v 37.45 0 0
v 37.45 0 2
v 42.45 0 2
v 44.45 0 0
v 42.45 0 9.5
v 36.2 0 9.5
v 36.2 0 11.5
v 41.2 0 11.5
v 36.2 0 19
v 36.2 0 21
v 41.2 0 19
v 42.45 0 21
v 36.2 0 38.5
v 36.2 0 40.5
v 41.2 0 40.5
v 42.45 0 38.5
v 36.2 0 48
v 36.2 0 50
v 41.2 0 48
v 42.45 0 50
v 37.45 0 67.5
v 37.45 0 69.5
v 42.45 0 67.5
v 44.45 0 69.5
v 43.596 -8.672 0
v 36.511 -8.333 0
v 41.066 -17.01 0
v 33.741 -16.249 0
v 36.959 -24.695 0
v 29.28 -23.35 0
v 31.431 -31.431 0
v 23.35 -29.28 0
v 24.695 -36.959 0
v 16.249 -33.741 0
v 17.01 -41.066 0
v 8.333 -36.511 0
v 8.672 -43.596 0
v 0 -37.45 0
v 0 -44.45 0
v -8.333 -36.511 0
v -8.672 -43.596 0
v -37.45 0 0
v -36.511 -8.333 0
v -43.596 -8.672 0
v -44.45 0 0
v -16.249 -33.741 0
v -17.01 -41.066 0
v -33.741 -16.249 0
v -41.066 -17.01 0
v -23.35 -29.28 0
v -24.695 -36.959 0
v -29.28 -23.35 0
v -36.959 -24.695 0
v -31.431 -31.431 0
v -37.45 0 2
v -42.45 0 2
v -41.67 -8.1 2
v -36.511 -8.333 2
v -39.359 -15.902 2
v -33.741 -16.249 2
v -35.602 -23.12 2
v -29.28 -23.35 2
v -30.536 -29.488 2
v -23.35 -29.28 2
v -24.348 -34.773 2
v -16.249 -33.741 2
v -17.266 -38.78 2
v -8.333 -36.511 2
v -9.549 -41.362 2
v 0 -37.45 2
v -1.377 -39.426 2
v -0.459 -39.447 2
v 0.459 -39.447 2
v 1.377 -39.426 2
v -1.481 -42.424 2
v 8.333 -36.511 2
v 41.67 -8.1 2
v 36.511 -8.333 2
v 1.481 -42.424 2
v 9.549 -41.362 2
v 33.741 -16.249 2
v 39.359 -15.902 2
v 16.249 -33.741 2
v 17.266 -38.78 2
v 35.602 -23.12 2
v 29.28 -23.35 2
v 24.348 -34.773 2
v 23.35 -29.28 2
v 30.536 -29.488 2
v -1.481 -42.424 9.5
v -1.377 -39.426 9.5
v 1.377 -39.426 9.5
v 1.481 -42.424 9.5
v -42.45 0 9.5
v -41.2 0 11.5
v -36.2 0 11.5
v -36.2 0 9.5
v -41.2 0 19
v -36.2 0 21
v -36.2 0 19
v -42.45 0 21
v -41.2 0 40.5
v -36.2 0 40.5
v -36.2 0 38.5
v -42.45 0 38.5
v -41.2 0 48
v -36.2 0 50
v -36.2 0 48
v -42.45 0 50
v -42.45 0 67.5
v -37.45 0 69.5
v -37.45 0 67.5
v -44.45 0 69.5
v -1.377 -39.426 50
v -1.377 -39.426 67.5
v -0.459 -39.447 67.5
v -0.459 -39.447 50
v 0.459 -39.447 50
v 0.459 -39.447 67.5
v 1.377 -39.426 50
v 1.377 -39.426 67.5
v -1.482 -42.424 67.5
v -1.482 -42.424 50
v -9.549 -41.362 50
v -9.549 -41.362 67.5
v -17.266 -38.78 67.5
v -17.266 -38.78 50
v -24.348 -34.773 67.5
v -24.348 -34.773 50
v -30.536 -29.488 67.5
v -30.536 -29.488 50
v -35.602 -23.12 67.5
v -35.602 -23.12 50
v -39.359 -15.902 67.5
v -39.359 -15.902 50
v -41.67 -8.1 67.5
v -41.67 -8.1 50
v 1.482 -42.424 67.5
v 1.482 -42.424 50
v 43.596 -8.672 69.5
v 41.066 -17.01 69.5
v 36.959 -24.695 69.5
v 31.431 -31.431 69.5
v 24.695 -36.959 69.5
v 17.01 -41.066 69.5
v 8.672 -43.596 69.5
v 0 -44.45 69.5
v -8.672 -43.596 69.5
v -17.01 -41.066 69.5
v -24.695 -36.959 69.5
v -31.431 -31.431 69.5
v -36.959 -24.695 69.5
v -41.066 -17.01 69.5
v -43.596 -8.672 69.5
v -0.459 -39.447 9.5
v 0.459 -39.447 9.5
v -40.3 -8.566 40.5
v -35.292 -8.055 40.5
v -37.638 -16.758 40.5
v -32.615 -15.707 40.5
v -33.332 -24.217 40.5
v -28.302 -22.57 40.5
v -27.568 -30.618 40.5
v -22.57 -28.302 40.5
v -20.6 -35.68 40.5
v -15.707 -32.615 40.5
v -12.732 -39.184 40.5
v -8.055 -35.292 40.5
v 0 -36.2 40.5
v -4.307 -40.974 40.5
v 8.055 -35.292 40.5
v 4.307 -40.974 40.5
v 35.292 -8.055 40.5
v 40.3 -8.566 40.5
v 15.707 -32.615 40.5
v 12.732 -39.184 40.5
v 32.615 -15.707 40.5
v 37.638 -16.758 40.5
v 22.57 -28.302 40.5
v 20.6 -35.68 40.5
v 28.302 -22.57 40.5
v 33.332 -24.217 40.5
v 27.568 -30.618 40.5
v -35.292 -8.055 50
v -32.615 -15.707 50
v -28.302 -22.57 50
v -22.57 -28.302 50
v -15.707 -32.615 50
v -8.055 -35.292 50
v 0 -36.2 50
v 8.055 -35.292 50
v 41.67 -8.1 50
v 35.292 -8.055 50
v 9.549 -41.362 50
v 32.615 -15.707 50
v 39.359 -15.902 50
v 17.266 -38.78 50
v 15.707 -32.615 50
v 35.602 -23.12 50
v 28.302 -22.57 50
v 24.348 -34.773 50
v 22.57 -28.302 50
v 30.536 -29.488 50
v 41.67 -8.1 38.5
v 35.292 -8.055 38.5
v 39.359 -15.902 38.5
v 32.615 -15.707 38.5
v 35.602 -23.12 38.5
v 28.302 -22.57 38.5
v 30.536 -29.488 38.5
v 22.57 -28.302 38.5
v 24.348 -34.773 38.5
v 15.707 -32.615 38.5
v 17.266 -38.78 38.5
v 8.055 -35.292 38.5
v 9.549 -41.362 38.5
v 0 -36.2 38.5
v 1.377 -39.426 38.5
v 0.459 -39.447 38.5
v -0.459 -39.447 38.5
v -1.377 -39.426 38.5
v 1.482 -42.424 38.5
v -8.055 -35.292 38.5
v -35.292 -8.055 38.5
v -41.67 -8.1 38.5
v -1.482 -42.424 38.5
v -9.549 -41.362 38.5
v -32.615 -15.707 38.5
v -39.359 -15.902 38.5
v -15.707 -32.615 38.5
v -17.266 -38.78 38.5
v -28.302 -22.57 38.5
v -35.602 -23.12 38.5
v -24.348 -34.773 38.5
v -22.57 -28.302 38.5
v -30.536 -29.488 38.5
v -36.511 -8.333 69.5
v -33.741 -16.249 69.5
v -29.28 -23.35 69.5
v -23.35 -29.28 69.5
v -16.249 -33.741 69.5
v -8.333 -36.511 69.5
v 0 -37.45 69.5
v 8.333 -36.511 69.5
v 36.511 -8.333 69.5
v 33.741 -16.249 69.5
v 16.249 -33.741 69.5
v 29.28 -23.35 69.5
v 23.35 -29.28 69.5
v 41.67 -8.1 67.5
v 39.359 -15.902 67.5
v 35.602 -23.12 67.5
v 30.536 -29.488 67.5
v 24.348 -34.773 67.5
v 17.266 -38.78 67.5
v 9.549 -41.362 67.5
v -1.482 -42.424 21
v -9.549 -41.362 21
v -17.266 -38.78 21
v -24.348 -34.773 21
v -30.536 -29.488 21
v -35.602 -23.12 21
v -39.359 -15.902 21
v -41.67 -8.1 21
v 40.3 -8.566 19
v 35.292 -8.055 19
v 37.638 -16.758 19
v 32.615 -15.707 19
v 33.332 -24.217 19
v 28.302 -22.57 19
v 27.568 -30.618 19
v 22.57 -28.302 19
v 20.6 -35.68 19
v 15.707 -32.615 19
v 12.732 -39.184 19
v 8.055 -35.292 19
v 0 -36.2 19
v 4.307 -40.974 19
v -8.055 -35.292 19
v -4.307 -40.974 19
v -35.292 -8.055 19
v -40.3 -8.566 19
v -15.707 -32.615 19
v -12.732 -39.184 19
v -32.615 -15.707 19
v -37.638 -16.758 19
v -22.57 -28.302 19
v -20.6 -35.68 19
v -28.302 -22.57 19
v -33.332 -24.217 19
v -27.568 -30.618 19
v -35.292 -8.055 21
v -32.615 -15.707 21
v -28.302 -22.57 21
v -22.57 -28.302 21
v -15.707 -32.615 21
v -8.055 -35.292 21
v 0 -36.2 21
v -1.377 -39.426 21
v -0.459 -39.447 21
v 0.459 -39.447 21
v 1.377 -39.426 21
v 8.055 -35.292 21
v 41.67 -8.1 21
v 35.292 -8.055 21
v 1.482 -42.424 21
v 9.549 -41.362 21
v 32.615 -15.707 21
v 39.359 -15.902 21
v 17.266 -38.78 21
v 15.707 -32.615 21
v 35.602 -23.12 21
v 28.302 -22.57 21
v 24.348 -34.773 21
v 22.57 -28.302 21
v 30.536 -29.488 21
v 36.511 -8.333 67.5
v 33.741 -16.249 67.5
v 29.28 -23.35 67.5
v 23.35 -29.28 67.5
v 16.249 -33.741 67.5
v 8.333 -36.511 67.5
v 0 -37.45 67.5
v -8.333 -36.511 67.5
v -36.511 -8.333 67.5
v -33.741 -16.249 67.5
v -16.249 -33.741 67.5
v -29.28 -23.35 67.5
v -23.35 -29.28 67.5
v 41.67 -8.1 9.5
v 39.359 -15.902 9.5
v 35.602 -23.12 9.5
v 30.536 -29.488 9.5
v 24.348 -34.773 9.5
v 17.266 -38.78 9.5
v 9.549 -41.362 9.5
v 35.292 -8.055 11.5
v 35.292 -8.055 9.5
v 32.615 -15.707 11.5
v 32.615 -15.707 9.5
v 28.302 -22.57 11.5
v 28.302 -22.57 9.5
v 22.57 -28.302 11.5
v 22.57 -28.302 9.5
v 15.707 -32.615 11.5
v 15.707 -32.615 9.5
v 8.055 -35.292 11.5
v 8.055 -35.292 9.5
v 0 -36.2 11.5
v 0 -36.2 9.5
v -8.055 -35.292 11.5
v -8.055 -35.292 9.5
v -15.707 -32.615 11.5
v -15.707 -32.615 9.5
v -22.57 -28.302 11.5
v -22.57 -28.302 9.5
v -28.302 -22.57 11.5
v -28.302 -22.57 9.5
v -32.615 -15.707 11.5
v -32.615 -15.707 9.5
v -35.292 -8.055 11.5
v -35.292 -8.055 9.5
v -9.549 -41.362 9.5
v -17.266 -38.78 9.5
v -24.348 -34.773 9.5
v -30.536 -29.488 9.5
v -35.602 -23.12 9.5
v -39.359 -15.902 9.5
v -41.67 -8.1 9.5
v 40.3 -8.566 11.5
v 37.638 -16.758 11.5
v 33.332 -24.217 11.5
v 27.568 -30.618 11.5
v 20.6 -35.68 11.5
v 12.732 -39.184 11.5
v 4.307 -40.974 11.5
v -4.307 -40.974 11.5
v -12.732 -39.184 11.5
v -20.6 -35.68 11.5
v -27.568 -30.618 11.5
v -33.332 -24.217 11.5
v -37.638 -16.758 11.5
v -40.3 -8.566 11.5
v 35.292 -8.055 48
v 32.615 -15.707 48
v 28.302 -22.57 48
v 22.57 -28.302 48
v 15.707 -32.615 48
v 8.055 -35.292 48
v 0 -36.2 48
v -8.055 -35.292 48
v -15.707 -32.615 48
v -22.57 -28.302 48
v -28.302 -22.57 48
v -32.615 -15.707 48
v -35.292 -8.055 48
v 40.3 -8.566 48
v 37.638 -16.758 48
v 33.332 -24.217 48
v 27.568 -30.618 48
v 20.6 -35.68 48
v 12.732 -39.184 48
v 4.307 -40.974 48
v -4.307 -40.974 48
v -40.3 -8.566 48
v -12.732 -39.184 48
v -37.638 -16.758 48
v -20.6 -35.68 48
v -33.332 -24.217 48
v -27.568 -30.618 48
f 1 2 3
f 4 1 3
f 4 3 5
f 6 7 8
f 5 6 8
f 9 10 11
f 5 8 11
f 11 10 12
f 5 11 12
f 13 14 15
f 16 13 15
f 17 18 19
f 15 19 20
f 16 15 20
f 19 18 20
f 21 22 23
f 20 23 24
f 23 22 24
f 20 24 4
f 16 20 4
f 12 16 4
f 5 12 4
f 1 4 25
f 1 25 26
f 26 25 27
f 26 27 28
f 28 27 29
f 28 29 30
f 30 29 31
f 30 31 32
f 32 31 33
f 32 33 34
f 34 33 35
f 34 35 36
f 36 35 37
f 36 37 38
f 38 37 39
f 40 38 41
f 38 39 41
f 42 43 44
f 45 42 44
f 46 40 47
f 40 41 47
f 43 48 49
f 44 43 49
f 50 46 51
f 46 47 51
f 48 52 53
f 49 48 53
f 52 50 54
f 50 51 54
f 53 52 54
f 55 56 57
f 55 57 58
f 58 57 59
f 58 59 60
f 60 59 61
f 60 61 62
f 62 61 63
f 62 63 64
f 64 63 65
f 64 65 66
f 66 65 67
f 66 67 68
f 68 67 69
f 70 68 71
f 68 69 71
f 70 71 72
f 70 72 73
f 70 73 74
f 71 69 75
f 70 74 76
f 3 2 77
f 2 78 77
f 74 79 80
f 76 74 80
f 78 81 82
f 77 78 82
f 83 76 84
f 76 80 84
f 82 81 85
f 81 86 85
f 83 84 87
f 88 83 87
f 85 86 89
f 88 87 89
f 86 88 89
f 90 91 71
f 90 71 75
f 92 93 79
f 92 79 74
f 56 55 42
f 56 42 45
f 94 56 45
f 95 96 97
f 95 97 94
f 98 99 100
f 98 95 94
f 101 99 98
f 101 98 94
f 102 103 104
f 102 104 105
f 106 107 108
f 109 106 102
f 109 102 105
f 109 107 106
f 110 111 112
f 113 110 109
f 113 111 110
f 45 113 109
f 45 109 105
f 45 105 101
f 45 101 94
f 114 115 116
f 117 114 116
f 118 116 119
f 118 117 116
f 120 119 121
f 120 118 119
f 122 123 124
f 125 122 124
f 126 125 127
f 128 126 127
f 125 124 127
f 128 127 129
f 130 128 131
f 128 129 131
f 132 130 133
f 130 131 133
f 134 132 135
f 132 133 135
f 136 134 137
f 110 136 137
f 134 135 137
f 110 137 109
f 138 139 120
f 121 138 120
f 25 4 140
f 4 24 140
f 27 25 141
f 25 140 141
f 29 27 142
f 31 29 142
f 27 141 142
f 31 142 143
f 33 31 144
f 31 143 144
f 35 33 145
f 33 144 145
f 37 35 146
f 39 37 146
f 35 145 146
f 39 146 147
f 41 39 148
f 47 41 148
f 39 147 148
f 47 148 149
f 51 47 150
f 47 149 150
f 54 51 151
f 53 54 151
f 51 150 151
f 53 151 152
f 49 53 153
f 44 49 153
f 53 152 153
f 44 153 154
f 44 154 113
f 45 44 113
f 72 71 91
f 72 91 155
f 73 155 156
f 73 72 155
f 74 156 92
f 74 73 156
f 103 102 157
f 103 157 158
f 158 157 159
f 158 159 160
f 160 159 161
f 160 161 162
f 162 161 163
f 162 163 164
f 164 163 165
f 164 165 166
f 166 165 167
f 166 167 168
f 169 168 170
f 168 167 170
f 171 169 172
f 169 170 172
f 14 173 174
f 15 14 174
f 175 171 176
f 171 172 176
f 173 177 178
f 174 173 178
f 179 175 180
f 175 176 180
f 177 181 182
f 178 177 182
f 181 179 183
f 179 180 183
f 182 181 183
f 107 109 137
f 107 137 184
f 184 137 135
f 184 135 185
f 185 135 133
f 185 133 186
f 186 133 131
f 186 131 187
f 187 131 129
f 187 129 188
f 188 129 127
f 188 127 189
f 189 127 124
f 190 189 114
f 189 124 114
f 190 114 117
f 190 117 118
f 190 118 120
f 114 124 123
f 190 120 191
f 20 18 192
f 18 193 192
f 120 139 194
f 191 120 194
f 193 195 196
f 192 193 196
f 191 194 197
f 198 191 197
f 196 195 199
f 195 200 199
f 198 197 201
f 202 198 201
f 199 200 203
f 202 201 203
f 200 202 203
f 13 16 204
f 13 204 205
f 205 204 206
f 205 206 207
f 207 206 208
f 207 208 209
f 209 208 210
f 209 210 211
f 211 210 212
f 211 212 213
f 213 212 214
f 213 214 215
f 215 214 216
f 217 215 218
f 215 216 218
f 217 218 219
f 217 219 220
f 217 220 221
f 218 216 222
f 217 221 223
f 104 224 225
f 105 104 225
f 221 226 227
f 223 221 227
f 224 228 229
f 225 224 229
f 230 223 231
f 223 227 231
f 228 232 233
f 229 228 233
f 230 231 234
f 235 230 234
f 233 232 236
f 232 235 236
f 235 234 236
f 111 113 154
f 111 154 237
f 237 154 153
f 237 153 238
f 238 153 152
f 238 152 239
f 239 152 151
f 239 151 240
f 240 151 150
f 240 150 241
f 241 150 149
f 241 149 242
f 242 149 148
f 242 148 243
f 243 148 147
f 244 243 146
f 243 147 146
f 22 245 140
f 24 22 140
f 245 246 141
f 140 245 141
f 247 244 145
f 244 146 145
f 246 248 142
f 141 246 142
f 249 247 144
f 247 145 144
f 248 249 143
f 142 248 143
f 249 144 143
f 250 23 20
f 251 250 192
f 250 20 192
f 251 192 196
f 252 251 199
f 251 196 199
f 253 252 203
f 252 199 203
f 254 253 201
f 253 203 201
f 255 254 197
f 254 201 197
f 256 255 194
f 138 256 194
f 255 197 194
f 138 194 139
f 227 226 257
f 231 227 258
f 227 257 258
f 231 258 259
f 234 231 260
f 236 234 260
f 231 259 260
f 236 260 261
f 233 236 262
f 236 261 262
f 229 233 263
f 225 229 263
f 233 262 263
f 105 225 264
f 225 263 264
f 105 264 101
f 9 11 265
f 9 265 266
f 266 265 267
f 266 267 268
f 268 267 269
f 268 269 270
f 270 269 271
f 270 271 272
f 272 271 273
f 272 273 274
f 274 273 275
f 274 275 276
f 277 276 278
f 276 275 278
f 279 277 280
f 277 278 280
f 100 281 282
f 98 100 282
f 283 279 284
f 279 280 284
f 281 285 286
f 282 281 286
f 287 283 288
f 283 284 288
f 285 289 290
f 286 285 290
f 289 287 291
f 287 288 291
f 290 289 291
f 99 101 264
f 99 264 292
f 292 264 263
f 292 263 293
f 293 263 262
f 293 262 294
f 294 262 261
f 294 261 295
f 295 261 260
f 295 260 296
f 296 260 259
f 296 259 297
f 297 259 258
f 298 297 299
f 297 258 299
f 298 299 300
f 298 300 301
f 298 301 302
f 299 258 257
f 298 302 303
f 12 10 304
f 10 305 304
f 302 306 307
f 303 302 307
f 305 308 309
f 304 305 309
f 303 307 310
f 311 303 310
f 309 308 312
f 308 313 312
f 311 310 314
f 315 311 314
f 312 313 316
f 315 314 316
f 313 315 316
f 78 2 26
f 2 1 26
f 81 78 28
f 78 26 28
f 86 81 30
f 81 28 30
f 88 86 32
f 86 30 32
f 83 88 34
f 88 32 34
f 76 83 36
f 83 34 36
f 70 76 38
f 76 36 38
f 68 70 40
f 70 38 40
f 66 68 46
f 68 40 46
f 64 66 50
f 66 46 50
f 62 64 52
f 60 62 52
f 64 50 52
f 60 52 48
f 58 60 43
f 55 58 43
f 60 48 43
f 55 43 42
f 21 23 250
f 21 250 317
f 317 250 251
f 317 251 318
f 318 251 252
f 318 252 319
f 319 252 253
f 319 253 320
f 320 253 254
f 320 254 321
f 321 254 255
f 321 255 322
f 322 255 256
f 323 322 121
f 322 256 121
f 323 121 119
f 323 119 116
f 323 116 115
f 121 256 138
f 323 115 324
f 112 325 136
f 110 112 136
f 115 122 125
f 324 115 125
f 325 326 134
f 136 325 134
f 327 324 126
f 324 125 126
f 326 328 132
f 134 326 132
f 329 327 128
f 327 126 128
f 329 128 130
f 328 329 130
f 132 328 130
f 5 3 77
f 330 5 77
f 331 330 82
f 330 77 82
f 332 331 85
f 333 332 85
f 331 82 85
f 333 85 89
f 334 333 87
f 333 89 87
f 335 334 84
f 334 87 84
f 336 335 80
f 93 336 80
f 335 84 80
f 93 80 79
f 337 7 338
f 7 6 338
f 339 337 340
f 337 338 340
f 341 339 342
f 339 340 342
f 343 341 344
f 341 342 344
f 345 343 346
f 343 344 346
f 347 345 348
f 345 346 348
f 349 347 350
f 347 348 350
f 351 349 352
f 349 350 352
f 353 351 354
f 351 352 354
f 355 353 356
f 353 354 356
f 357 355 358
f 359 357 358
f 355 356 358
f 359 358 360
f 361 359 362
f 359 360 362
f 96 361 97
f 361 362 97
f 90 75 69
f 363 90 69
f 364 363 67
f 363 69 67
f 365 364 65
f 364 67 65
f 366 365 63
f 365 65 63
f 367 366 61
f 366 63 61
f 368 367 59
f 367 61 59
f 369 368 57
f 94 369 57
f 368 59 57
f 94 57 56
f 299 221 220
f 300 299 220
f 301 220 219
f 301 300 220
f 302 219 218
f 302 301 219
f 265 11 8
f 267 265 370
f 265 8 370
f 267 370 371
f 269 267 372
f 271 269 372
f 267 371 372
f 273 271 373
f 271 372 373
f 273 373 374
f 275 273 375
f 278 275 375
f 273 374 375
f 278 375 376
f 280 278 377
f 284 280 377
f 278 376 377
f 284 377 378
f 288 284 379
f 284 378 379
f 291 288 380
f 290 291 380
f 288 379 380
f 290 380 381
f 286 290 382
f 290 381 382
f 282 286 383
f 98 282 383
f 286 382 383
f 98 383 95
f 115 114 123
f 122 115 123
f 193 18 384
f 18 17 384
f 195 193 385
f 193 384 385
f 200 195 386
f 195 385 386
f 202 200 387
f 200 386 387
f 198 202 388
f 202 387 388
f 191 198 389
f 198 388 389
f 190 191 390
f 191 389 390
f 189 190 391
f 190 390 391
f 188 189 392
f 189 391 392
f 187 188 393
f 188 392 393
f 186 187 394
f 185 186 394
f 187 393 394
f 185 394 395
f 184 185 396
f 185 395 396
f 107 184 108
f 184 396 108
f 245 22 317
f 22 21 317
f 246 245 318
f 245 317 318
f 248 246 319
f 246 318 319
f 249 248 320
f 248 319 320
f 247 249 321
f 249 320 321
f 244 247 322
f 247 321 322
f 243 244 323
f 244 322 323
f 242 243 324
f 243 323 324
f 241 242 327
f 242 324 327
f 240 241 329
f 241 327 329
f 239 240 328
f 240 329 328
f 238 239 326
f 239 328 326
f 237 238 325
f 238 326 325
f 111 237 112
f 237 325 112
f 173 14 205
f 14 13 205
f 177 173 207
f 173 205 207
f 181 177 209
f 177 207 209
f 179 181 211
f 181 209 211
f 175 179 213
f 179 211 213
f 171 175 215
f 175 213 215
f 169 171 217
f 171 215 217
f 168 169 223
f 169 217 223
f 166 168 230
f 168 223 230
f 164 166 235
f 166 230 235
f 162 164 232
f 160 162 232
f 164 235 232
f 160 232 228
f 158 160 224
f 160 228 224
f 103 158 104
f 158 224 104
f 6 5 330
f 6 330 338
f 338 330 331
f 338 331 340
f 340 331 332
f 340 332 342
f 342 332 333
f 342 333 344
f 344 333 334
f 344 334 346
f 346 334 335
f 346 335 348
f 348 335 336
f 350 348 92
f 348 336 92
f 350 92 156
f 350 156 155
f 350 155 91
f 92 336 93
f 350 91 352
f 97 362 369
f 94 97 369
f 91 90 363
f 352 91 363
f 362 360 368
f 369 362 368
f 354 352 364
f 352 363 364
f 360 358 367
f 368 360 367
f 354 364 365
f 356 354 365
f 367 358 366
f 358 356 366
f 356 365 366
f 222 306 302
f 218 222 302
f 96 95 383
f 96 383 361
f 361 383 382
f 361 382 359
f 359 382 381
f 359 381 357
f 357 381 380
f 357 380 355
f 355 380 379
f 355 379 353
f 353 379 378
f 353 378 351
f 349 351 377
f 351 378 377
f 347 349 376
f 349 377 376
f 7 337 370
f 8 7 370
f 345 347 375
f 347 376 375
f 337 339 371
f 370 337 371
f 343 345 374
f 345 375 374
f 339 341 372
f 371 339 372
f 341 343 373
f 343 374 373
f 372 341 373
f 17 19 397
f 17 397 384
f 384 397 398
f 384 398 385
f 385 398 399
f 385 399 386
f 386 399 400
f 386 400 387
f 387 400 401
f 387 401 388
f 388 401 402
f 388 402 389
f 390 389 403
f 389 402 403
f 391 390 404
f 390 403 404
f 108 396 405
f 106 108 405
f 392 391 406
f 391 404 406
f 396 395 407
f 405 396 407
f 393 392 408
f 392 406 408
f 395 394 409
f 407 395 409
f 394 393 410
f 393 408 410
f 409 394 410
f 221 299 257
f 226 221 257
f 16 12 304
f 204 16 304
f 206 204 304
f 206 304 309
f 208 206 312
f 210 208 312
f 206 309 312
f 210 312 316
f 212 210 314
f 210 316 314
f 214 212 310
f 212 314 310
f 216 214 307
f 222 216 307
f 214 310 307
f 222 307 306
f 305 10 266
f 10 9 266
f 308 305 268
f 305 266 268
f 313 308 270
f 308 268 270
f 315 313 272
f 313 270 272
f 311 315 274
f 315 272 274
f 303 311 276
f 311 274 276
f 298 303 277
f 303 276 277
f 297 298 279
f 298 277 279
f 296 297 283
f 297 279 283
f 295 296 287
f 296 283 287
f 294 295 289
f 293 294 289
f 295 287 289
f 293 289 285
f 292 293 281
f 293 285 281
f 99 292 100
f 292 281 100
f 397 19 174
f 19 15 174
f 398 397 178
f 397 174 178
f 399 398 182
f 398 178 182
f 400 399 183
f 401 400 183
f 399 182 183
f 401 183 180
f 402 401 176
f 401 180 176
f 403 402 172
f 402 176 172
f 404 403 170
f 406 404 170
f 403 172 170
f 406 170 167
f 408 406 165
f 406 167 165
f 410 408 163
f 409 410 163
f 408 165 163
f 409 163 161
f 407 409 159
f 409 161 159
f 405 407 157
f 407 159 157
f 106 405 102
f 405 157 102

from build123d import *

# Parameters (mm, degrees)
REVOLUTION_ANGLE = -180
PAD_DEPTH        = 7.5
PAD001_DEPTH     = 17.5
PAD002_DEPTH     = 17.5


with BuildPart() as part:
    # Sketch → Revolution (revolve)
    with BuildSketch(Plane.XZ):
        Polygon((37.45, 69.5), (37.45, 67.5), (42.45, 67.5), (42.45, 50.0000000001), (36.2, 50.0000000001), (36.2, 48.0000000001), (41.2, 48.0000000001), (41.2, 40.5000000001), (36.2, 40.5000000001), (36.2, 38.5000000001), (42.45, 38.5000000001), (42.45, 21.0000000001), (36.2, 21.0000000001), (36.2, 19.0000000001), (41.2, 19.0000000001), (41.2, 11.5000000001), (36.2, 11.5000000001), (36.2, 9.5000000001), (42.45, 9.5000000001), (42.45, 2.0000000001), (37.45, 2.0000000001), (37.45, 0), (44.45, 0), (44.45, 69.5), align=None)
    revolve(axis=Axis((0, 0, 0), (0, 0, 1)), revolution_arc=REVOLUTION_ANGLE)

    # Sketch001 (on DatumPlane) → Pad (new body)
    with BuildSketch(Plane.XY.offset(2)):
        with BuildLine():
            ThreePointArc((-1.481483635, -42.424140607), (0, -42.45), (1.481483635, -42.424140607))
            Line((1.481483635, -42.424140607), (1.3767851449, -39.4259681259))
            ThreePointArc((-1.3767851449, -39.4259681259), (0, -39.45), (1.3767851449, -39.4259681259))
            Line((-1.3767851449, -39.4259681259), (-1.481483635, -42.424140607))
        make_face()
    extrude(amount=PAD_DEPTH)

    # Sketch002 (on DatumPlane) → Pad001 (join)
    with BuildSketch(Plane.XY.offset(21)):
        with BuildLine():
            ThreePointArc((-1.4815012393, -42.4241399922), (0, -42.45), (1.4815012393, -42.4241399922))
            Line((1.4815012393, -42.4241399922), (1.3768015051, -39.4259675545))
            ThreePointArc((-1.3768015051, -39.4259675545), (0, -39.45), (1.3768015051, -39.4259675545))
            Line((-1.3768015051, -39.4259675545), (-1.4815012393, -42.4241399922))
        make_face()
    extrude(amount=PAD001_DEPTH)

    # Sketch003 (on DatumPlane) → Pad002 (join)
    with BuildSketch(Plane.XY.offset(50)):
        with BuildLine():
            ThreePointArc((-1.4815012393, -42.4241399922), (0, -42.45), (1.4815012393, -42.4241399922))
            Line((1.4815012393, -42.4241399922), (1.3768015051, -39.4259675545))
            ThreePointArc((-1.3768015051, -39.4259675545), (0, -39.45), (1.3768015051, -39.4259675545))
            Line((-1.3768015051, -39.4259675545), (-1.4815012393, -42.4241399922))
        make_face()
    extrude(amount=PAD002_DEPTH)


solid = part.part
